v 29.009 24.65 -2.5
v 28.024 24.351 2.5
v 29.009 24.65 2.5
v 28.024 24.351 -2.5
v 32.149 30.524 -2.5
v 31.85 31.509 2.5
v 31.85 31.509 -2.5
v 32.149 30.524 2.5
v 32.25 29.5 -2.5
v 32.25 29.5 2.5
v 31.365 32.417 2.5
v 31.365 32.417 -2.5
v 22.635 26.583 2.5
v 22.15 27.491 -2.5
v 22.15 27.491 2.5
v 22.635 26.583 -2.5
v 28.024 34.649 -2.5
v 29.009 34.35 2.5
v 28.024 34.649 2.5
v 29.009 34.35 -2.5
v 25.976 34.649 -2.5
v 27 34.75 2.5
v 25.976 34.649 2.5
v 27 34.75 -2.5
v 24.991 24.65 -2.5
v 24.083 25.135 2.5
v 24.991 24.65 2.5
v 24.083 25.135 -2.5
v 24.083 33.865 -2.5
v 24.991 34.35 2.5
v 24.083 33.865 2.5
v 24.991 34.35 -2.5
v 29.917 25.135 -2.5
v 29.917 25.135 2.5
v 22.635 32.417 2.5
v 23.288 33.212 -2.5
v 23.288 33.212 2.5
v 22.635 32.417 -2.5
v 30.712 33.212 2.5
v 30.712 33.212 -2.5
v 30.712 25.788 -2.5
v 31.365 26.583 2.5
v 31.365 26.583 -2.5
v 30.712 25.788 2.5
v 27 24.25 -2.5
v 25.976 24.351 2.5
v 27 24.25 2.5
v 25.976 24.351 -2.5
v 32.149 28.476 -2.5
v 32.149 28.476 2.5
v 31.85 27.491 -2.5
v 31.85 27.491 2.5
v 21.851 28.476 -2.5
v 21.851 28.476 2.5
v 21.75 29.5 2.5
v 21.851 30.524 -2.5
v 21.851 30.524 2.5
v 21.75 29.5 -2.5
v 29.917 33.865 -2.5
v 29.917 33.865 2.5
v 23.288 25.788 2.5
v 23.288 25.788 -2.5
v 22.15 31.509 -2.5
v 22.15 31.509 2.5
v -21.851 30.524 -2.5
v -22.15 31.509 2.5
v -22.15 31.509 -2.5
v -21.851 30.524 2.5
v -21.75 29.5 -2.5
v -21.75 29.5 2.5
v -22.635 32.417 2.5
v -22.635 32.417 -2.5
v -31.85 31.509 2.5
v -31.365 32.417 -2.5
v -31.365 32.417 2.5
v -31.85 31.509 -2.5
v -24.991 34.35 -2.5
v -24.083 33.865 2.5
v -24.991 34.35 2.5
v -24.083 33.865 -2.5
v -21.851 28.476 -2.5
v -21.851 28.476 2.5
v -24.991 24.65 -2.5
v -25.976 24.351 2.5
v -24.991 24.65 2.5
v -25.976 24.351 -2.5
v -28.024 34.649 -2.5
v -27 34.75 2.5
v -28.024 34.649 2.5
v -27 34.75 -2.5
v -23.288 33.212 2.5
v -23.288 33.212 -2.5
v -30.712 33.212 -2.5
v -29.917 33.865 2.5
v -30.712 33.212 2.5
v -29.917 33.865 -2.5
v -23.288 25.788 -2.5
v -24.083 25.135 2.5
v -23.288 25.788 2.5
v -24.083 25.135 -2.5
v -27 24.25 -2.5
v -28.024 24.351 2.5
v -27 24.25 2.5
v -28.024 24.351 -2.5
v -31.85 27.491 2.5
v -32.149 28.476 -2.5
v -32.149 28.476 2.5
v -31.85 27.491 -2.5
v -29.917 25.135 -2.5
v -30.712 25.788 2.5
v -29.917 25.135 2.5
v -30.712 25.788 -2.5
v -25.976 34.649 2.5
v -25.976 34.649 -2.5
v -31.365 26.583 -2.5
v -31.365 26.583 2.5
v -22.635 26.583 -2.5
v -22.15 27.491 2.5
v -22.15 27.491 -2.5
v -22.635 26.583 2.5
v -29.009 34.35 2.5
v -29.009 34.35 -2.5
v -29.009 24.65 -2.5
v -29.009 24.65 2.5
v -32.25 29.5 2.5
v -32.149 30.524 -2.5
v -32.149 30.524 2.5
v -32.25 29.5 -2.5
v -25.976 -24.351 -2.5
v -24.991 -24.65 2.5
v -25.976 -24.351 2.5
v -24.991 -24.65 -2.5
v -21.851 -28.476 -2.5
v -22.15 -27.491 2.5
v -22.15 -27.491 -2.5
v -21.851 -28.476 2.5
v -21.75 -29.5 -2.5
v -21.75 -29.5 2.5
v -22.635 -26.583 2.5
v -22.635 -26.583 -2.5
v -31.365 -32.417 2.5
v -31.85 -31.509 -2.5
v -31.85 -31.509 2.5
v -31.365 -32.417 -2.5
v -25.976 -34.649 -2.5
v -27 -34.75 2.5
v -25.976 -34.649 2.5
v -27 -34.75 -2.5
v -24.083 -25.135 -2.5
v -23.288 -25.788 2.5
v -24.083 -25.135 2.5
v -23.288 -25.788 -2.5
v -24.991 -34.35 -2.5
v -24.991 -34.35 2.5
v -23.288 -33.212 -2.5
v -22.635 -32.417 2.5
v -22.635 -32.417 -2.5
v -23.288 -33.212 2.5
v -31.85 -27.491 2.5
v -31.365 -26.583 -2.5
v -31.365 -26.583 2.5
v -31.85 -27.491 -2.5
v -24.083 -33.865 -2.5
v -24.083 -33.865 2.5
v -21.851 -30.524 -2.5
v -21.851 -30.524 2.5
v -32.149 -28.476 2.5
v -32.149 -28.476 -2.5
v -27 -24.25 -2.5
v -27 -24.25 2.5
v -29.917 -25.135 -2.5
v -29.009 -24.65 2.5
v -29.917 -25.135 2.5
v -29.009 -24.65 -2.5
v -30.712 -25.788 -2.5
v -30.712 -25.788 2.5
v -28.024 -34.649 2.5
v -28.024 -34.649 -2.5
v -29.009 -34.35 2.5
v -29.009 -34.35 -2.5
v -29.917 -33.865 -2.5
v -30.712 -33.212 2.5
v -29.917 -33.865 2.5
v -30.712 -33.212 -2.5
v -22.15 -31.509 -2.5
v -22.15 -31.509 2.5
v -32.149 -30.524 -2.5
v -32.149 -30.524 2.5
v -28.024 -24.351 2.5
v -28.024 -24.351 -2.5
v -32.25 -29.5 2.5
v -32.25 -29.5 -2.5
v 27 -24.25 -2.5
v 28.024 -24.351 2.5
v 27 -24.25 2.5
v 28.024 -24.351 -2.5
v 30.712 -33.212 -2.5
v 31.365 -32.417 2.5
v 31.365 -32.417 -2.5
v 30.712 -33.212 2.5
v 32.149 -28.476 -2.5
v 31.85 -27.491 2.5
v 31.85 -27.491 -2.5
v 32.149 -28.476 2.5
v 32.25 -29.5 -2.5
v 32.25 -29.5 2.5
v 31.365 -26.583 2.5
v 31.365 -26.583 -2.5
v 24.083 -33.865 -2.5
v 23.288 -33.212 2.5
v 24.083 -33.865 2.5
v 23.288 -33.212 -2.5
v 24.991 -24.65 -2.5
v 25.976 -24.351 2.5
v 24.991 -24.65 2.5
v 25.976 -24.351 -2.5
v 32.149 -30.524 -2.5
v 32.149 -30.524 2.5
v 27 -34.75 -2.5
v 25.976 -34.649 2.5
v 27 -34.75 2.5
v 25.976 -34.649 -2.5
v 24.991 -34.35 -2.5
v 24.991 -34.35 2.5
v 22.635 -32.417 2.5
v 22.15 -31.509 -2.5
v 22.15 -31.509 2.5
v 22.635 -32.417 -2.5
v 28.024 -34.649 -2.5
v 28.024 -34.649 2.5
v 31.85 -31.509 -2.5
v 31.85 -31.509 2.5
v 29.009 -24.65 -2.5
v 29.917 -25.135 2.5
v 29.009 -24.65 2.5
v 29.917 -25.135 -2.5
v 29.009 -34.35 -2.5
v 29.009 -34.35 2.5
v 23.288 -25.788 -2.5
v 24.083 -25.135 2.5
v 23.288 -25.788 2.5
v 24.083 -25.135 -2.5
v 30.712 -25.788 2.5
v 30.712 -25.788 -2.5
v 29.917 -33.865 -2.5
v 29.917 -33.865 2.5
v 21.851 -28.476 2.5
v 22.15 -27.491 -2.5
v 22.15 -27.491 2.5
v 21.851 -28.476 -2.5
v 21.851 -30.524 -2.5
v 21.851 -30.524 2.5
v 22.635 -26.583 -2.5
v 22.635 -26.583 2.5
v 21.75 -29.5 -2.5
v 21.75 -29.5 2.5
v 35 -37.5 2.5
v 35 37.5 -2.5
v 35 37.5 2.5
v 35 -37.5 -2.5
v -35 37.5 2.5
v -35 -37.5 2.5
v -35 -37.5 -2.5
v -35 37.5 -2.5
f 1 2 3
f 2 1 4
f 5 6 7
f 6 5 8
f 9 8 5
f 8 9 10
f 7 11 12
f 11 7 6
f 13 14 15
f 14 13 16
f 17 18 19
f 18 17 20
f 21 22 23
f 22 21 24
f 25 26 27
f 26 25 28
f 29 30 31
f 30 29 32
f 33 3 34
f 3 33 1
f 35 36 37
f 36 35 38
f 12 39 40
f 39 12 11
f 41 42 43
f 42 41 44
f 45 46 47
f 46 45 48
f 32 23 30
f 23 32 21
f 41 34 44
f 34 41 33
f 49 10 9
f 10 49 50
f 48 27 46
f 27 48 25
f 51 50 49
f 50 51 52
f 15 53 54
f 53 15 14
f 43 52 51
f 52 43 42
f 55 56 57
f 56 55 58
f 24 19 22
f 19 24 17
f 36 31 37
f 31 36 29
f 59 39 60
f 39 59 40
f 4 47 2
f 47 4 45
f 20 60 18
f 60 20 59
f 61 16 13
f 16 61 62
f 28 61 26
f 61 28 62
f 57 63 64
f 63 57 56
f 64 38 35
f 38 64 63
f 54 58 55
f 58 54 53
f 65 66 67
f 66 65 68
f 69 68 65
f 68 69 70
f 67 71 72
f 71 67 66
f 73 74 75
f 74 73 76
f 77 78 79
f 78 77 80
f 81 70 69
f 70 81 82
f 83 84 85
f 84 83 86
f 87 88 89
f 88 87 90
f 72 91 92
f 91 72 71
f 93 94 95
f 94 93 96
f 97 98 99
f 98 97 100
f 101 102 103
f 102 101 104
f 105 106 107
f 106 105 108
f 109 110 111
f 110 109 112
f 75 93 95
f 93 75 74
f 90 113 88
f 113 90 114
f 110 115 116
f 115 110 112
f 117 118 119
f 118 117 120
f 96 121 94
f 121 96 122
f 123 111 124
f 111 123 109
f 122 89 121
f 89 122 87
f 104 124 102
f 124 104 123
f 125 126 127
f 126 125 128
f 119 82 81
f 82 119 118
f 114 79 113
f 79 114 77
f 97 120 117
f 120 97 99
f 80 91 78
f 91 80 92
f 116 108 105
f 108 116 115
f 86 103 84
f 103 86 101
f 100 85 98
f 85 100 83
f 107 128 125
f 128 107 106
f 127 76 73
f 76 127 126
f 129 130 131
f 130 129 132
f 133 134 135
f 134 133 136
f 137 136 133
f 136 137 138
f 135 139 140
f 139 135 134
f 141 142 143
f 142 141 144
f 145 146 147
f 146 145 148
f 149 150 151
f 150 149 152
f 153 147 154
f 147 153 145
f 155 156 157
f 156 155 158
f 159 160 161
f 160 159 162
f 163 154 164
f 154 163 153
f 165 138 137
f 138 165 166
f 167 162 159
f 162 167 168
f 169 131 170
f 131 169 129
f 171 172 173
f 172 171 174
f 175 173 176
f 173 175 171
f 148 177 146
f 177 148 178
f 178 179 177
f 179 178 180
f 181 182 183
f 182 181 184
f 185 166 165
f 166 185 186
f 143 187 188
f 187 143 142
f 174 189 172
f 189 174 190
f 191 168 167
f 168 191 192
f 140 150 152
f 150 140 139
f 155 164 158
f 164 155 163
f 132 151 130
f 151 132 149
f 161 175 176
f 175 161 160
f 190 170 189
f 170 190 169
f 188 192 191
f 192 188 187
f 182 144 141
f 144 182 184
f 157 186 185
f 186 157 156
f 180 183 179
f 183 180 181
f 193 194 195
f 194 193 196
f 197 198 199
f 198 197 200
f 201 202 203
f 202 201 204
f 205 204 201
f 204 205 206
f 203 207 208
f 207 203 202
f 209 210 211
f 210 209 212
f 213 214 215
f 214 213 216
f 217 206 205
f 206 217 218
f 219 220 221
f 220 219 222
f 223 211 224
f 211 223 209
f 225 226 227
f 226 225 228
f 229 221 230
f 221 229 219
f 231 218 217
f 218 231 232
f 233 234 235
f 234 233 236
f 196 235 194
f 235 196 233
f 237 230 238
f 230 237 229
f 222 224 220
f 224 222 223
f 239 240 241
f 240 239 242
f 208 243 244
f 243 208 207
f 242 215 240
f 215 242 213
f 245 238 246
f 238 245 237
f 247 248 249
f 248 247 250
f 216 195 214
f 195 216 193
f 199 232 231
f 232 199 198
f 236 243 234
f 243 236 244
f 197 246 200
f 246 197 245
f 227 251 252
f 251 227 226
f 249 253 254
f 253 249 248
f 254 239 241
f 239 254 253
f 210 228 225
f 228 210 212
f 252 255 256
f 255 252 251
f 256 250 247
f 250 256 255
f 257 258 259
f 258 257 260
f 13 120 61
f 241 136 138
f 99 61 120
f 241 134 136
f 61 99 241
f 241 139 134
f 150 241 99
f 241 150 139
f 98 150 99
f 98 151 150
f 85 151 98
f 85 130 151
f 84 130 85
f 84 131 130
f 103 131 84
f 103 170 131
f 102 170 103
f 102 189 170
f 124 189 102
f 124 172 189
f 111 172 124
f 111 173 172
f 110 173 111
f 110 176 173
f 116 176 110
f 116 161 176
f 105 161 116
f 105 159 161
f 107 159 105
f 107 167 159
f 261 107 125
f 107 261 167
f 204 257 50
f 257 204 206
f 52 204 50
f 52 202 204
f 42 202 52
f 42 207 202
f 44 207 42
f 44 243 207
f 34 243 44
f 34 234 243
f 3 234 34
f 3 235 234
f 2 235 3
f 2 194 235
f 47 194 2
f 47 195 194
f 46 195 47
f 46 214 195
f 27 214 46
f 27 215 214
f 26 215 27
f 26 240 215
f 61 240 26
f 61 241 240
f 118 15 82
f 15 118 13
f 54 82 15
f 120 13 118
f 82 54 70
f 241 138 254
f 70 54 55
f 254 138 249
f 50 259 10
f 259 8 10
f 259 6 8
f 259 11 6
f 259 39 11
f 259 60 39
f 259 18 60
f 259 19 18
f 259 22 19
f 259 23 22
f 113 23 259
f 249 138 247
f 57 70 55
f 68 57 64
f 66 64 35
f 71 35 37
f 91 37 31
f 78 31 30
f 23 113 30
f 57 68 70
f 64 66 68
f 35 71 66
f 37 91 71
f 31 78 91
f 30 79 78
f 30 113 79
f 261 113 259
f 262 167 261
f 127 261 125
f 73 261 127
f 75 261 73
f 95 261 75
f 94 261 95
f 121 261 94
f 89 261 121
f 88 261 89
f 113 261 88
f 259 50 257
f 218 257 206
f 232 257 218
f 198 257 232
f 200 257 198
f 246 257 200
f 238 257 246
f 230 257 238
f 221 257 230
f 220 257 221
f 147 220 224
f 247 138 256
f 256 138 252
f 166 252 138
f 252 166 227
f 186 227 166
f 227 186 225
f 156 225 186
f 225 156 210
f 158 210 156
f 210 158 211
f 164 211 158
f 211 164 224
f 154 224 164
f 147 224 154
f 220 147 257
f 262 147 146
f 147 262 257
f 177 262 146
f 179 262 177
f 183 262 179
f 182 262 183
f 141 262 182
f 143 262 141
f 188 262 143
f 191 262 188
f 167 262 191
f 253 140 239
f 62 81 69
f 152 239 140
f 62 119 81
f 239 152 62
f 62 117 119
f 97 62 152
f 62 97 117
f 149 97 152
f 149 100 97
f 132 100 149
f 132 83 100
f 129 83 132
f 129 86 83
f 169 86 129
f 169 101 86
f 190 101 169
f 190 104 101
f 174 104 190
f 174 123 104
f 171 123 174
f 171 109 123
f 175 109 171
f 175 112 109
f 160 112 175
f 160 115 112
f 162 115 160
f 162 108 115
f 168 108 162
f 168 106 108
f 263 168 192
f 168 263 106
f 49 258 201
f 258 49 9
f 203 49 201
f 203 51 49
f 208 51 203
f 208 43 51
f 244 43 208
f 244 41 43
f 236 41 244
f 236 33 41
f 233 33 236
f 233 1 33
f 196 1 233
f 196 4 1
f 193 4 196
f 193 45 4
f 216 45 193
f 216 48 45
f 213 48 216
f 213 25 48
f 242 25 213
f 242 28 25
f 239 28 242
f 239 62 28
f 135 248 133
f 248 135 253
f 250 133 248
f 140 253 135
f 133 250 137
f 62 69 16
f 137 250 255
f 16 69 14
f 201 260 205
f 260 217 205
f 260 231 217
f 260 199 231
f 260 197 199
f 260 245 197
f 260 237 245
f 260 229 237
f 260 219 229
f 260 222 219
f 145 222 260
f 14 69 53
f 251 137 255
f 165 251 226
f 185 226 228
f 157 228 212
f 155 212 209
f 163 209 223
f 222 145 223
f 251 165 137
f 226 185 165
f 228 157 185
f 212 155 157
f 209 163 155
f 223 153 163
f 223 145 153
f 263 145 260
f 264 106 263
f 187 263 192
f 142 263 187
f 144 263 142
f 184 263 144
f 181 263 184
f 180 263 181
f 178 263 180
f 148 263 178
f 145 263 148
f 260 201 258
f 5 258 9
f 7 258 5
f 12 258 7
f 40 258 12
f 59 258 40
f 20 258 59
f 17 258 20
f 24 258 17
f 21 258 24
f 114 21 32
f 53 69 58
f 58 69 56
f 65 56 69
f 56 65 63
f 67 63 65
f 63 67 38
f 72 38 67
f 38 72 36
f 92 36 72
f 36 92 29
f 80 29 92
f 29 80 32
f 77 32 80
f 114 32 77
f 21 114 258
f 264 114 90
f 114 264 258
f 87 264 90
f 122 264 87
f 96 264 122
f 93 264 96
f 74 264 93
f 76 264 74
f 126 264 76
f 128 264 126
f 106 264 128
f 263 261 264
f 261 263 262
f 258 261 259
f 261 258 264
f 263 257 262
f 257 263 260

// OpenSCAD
$fn = 32;

// ----------------------------------------------------------------------
// Corner plate 70 x 75 x 5
// 4 holes, centres taken from the edge offset
// ----------------------------------------------------------------------

// --- parameters (mm) ---
plate = [70, 75, 5];  // overall size (x, y, z)
holes = 4;            // number of holes the drawing asks for
hole_d = 10.5;        // hole diameter
edge = 8;             // hole centre offset from the plate edge

// --- derived feature positions (mm) ---
corner_x = plate[0] / 2 - edge;  // = 27   corner hole X
corner_y = plate[1] / 2 - edge;  // = 29.5   corner hole Y
feature_centers = [
  [corner_x, corner_y],
  [-corner_x, corner_y],
  [-corner_x, -corner_y],
  [corner_x, -corner_y]
];   // hole centres the loop below drills

// plate outline, every hole drilled through with the same cutters
difference() {
  cube(plate, center = true);
  for (centre = feature_centers)
    translate([centre[0], centre[1], 0])
      cylinder(d = hole_d, h = plate[2] + 2, center = true);
}
